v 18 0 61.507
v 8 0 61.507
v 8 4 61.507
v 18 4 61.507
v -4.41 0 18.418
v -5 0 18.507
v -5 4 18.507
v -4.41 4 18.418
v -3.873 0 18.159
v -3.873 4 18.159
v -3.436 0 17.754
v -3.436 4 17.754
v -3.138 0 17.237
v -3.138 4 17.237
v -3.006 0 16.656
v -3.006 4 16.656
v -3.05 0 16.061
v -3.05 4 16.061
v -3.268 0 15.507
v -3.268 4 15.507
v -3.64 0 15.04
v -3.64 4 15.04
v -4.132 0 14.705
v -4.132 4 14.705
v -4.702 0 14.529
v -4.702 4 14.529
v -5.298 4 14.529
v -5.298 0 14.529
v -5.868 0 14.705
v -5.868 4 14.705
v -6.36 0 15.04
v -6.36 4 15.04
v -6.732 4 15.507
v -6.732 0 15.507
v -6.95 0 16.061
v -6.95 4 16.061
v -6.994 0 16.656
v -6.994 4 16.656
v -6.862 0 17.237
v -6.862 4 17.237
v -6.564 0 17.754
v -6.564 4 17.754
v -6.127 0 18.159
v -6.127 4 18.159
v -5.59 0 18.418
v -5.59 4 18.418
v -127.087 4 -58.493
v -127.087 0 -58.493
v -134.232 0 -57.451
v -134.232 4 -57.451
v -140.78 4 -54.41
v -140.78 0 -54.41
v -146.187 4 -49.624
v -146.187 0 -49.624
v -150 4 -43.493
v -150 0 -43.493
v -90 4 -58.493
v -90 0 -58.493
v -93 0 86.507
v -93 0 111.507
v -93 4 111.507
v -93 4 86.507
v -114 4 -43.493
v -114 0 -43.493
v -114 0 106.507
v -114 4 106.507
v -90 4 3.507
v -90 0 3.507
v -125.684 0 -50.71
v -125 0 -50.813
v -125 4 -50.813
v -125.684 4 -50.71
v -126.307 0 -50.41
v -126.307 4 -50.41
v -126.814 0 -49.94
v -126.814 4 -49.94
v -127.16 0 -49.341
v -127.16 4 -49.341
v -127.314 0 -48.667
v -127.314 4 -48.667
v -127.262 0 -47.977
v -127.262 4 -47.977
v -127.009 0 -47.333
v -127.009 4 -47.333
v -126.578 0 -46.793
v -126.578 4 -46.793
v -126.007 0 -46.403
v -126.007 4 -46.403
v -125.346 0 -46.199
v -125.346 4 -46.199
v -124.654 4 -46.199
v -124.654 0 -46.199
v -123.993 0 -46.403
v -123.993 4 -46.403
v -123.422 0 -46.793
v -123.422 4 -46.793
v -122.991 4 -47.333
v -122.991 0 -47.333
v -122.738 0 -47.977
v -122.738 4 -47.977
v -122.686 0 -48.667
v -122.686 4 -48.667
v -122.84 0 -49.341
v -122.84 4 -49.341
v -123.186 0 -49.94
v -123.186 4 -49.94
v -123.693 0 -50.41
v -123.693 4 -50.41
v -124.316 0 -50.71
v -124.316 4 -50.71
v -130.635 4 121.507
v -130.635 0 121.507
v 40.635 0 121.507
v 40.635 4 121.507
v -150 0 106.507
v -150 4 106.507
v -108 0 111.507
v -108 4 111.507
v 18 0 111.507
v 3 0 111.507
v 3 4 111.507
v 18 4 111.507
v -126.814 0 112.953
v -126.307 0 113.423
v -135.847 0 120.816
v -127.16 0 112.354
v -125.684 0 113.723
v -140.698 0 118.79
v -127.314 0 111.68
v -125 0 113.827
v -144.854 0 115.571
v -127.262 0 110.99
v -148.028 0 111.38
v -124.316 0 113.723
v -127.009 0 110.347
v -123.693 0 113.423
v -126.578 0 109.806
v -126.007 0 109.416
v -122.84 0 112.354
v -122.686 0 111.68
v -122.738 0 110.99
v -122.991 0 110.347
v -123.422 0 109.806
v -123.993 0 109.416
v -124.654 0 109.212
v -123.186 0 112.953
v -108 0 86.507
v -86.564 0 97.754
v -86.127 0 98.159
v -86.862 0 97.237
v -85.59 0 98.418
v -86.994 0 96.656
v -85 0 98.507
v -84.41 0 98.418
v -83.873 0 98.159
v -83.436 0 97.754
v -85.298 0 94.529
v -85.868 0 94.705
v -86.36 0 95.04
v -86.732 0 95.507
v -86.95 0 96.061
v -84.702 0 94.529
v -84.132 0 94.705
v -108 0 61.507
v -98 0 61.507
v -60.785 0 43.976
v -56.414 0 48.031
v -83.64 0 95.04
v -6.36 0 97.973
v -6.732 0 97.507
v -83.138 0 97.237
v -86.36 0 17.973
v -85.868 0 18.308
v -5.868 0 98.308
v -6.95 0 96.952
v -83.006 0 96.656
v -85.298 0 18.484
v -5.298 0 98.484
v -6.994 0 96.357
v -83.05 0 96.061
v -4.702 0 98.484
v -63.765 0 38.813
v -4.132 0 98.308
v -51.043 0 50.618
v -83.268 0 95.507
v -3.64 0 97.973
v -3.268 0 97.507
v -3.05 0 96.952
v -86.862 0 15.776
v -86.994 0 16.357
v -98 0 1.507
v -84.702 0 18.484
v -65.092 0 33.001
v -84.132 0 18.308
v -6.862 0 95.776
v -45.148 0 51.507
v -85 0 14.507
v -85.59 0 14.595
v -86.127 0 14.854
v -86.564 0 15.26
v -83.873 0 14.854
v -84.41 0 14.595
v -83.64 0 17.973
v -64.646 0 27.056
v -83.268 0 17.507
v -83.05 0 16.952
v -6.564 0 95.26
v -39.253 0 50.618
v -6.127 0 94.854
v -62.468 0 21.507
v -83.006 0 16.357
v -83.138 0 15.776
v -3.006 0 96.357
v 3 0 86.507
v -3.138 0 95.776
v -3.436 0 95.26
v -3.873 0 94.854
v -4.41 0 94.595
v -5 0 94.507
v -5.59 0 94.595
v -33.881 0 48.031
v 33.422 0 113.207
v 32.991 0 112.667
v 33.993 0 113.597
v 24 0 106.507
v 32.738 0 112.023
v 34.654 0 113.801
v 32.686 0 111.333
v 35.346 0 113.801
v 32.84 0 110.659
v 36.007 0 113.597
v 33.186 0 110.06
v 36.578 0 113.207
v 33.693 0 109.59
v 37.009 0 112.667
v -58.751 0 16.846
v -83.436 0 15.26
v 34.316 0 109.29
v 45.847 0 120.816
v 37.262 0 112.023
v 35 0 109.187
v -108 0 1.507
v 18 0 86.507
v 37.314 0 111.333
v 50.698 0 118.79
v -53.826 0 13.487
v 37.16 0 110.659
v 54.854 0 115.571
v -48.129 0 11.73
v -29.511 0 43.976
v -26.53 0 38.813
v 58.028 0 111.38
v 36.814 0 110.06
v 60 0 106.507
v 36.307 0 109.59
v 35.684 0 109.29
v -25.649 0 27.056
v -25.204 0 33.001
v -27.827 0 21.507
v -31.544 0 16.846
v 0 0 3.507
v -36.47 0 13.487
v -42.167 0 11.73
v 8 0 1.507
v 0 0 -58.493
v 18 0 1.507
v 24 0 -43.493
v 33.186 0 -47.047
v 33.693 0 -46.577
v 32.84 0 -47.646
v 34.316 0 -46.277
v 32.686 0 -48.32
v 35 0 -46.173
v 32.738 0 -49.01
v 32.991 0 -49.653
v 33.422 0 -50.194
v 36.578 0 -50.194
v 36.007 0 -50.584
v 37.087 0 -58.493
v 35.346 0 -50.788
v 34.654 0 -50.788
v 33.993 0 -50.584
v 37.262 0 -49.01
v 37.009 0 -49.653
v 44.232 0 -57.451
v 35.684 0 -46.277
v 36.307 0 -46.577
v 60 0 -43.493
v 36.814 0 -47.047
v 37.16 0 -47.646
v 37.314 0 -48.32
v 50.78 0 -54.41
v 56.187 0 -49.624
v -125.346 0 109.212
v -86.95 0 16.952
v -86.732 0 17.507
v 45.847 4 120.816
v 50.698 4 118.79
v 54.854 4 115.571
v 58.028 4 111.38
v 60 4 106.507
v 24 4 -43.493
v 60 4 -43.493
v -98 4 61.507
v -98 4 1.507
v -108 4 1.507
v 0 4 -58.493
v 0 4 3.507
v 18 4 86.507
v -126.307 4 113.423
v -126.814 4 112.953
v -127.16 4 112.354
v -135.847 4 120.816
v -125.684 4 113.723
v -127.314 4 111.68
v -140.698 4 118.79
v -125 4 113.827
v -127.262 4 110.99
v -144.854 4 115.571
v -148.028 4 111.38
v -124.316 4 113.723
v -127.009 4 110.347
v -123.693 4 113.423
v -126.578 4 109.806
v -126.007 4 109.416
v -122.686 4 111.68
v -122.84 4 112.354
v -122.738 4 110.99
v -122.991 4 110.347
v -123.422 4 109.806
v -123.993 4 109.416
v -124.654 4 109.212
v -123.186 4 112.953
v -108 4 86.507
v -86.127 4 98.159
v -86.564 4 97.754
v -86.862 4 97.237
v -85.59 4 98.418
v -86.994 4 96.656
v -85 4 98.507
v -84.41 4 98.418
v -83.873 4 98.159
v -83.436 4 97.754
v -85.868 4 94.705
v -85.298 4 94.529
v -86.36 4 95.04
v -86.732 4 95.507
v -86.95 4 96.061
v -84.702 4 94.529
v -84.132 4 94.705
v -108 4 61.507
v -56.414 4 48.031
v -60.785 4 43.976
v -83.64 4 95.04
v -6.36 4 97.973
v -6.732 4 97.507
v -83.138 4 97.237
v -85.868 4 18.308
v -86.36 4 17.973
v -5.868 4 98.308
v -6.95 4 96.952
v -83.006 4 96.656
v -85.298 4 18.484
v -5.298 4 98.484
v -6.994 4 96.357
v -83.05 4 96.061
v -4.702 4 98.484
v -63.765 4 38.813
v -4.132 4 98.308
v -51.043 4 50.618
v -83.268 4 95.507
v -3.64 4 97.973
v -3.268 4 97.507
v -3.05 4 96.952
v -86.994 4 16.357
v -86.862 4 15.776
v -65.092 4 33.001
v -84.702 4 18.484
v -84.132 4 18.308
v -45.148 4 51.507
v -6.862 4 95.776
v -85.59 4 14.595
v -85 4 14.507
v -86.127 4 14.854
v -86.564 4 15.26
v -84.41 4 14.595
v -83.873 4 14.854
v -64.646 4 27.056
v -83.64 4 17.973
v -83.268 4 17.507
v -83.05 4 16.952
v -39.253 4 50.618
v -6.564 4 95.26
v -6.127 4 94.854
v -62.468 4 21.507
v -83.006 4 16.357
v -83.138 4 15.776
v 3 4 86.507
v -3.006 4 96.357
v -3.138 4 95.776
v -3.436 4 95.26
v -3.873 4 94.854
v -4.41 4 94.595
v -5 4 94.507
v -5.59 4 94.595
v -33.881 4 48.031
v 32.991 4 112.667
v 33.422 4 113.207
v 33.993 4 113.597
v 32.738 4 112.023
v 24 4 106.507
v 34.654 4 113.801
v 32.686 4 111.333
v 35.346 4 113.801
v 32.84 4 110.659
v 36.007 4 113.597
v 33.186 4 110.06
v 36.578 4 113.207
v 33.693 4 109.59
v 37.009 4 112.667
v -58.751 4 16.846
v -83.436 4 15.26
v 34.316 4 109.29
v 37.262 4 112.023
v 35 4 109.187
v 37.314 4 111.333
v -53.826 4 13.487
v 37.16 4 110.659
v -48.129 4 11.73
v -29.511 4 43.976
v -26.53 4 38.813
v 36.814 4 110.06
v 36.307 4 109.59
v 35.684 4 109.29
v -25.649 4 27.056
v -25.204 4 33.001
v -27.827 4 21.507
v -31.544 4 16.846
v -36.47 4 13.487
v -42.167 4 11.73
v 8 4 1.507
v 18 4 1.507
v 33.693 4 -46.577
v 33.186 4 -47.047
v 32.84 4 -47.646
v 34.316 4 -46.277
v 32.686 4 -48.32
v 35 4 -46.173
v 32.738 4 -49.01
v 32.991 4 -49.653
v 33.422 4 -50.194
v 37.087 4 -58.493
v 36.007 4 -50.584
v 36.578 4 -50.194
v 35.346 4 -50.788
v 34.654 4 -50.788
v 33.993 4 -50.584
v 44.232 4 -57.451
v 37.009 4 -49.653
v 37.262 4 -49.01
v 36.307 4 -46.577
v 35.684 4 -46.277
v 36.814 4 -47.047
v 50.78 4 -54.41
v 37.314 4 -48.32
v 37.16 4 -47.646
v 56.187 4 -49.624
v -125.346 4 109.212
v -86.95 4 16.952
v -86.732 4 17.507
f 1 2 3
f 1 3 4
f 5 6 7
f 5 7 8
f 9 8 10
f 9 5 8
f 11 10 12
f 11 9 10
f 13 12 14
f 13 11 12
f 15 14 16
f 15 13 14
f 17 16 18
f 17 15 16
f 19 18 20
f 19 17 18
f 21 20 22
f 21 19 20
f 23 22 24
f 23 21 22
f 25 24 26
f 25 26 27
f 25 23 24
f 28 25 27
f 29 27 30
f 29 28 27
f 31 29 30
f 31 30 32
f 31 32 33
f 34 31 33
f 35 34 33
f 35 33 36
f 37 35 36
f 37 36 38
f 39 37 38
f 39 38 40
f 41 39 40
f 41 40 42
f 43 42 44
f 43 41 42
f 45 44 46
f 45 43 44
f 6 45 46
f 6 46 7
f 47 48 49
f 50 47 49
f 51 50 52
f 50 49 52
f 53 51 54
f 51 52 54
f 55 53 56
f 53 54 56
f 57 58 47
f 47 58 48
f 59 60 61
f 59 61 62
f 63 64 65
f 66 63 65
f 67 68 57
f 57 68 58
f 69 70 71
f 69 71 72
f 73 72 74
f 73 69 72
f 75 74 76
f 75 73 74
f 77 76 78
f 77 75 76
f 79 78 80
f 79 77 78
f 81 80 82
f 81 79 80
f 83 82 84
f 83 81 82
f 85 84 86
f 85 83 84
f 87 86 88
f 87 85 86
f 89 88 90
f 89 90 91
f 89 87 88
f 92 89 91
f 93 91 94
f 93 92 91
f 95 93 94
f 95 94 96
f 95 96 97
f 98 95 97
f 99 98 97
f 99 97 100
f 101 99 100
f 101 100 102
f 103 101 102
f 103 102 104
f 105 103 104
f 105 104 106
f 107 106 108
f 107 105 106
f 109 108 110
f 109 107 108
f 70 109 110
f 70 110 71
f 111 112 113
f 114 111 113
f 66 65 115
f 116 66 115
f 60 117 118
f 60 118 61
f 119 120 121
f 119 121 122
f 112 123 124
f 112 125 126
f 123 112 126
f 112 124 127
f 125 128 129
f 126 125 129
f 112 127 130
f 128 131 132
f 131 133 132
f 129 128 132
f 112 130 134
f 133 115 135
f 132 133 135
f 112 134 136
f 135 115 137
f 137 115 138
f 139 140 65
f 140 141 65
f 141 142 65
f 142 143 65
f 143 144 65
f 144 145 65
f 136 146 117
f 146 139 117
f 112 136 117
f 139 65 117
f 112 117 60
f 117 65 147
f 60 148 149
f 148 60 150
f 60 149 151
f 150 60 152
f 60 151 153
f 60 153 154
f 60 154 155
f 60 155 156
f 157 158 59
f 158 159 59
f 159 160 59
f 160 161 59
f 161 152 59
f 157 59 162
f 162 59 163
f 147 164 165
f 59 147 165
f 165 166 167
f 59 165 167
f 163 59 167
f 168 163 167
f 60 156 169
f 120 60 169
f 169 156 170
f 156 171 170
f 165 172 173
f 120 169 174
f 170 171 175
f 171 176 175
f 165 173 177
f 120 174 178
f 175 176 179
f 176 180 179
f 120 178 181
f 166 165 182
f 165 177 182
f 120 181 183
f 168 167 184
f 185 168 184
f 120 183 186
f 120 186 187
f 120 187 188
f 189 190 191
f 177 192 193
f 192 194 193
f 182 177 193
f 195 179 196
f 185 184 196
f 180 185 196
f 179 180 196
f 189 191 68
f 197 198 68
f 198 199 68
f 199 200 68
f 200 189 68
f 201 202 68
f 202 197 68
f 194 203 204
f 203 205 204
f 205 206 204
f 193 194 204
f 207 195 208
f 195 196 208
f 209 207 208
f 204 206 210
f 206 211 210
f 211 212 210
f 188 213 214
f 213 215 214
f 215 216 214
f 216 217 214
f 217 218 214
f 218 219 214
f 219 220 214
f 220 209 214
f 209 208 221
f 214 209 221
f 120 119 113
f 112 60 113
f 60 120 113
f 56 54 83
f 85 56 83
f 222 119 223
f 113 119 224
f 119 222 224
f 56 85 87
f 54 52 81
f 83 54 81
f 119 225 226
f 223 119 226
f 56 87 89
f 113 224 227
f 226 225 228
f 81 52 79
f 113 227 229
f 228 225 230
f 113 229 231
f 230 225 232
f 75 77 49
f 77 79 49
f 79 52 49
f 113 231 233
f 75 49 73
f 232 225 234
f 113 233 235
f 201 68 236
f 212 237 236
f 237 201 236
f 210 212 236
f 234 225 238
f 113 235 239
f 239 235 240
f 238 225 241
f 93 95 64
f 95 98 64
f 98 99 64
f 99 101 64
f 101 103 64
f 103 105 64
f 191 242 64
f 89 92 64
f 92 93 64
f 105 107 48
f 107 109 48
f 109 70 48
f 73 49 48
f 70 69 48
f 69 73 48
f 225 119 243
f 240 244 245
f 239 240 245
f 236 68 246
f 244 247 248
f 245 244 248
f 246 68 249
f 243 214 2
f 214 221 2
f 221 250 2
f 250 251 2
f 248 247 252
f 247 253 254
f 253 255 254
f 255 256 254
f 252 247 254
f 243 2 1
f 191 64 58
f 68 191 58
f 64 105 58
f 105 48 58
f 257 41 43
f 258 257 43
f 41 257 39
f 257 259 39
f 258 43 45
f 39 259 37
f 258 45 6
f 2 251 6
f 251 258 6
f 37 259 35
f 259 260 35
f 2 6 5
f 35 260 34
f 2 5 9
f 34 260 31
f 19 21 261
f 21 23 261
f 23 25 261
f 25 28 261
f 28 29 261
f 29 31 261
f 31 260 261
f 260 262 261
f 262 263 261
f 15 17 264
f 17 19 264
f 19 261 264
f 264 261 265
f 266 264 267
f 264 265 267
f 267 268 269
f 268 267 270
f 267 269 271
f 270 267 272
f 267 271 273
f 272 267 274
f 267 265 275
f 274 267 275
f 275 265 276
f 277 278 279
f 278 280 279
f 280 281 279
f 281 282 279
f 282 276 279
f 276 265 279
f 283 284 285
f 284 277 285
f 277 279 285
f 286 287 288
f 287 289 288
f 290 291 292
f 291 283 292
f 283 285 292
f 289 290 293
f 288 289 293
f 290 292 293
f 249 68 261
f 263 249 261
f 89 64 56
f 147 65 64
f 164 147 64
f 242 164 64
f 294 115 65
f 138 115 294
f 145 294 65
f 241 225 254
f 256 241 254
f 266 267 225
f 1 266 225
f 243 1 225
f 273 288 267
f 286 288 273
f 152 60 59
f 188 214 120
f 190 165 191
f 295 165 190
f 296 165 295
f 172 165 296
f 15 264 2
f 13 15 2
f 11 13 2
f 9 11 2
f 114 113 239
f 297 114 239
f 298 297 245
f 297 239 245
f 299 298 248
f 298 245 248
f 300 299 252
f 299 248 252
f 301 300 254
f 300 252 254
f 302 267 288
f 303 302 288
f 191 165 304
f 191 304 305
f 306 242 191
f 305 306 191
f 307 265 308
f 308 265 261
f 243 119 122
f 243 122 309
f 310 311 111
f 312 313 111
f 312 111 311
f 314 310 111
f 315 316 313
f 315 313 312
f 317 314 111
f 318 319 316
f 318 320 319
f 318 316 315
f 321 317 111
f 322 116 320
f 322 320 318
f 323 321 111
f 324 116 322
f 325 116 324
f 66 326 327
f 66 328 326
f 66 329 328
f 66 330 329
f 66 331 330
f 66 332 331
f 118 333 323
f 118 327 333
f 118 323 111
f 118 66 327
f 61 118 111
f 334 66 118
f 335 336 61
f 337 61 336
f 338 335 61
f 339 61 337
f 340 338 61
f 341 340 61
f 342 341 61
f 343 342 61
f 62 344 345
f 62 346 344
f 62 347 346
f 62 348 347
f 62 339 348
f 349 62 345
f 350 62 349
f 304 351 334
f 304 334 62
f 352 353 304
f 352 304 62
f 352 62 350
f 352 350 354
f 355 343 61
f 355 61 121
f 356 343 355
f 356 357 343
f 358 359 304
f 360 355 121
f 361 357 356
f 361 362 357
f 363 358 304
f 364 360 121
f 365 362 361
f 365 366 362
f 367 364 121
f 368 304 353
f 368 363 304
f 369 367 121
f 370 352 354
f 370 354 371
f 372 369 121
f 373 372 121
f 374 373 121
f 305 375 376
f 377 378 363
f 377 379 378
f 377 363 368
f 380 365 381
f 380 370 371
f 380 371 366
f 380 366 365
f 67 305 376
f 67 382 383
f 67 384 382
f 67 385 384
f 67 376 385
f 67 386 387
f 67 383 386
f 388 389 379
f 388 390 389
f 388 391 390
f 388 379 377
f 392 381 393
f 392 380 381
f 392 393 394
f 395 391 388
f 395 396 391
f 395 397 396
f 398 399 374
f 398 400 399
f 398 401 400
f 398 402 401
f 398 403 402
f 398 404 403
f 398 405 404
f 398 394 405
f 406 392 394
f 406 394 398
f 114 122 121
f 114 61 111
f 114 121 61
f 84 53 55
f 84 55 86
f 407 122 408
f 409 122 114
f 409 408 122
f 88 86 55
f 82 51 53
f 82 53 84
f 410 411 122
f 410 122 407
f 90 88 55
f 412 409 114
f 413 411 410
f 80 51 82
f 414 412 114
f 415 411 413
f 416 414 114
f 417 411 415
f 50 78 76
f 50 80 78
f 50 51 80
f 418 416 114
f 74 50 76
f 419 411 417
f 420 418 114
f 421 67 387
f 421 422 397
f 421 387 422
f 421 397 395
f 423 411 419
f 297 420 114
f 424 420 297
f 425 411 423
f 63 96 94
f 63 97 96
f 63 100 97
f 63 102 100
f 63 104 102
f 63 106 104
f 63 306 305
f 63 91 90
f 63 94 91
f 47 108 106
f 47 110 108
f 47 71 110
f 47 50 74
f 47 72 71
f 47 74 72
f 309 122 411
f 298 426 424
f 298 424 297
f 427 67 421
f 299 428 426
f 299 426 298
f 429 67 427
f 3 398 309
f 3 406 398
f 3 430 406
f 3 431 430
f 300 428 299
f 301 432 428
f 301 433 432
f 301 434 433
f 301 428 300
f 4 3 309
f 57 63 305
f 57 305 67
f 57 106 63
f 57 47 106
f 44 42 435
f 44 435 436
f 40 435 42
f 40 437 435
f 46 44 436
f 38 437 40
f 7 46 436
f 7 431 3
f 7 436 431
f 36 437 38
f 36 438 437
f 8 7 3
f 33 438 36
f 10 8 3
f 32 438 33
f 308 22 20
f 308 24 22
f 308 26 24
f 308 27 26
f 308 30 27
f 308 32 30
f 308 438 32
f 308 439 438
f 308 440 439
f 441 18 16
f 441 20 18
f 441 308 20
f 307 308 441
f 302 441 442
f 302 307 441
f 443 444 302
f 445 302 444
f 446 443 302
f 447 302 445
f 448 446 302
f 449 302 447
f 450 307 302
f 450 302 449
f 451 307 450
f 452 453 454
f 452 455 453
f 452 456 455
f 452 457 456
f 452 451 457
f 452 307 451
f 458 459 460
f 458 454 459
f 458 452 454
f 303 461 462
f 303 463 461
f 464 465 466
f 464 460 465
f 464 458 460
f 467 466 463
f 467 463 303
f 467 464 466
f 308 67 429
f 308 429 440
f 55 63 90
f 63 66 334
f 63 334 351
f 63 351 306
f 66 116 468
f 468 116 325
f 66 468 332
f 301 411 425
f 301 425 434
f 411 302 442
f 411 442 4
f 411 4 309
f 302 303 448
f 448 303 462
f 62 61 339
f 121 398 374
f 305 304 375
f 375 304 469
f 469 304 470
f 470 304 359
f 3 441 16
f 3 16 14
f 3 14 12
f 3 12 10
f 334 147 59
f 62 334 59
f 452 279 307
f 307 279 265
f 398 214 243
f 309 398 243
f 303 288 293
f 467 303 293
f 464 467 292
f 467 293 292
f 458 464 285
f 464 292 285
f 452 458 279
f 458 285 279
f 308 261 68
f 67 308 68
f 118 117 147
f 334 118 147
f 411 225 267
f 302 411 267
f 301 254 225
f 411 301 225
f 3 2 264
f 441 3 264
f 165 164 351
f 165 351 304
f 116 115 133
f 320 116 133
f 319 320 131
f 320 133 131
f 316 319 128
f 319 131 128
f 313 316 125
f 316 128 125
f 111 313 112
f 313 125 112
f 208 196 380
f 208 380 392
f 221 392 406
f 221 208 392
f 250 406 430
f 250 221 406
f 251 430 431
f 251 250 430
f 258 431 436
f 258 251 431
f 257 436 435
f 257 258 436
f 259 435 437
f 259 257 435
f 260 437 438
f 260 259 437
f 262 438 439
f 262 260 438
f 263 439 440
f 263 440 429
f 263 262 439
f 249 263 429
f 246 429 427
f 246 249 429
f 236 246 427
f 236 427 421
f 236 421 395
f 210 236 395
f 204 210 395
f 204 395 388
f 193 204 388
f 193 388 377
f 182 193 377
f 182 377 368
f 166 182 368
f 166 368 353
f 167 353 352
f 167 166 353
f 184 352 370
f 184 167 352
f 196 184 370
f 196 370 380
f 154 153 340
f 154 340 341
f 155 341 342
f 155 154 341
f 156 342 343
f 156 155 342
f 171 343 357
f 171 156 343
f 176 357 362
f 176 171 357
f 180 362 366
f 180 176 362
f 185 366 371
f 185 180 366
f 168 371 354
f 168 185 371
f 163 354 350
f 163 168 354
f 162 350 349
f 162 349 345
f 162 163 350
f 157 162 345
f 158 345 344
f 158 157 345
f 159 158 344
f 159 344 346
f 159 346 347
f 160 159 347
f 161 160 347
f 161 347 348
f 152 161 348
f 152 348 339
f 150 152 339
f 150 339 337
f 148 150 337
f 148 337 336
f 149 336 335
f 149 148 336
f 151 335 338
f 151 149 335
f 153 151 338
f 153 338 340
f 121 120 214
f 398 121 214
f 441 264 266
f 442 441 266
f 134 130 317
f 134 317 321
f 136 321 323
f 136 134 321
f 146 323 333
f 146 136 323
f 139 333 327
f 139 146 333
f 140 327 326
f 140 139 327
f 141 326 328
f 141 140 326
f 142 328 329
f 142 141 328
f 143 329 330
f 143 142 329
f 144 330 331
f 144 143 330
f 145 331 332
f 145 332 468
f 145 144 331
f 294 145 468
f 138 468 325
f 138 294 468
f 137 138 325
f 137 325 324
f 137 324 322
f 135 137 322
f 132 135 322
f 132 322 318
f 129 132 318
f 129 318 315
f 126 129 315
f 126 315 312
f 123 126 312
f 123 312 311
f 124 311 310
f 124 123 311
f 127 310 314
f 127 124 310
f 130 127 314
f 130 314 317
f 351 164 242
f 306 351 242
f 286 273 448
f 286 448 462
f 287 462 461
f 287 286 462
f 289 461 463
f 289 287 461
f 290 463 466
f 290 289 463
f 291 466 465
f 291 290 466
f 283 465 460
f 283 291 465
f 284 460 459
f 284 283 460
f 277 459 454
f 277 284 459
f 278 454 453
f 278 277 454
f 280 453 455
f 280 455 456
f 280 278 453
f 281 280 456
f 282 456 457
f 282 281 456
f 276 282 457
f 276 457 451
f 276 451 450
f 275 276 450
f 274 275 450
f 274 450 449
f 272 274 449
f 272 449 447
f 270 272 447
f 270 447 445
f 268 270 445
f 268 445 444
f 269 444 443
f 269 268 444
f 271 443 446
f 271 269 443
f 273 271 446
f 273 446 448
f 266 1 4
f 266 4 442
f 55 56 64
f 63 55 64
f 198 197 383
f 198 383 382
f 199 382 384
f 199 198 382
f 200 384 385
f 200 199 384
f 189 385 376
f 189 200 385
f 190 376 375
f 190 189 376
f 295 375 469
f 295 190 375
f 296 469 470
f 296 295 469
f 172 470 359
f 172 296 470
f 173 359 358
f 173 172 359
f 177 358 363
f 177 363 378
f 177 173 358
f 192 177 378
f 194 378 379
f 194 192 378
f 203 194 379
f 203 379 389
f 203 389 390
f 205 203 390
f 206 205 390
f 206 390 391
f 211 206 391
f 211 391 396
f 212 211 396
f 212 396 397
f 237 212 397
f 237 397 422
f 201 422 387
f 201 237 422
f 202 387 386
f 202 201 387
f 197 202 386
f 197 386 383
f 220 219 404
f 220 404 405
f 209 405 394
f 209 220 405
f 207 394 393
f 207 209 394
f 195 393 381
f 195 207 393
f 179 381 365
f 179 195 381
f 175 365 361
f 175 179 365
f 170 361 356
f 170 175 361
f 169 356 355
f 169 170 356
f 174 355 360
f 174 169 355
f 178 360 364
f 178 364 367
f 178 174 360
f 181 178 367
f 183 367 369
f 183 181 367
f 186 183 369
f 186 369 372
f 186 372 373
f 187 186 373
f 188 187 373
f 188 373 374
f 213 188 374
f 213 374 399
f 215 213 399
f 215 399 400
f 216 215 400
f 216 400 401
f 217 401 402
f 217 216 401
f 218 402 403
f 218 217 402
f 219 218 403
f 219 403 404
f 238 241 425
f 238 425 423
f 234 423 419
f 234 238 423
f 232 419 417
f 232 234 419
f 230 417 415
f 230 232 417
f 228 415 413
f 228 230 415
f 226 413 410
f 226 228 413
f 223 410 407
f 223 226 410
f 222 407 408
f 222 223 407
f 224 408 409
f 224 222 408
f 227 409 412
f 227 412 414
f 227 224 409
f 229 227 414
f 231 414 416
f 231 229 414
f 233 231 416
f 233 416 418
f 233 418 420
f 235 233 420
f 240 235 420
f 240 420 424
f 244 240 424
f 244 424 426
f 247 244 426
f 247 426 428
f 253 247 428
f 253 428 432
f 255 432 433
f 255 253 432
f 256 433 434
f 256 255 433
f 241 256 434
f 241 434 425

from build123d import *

# Parameters (mm, degrees)
SKETCH1_R           = 20
SKETCH1_R_2         = 2.32
SKETCH1_R_3         = 2
SKETCH1_W           = 10
SKETCH1_H           = 60
SKETCH1_W_2         = 15
SKETCH1_H_2         = 25
BOSS_EXTRUDE1_DEPTH = 4
FILLET2_R           = 20
FILLET3_R           = 25


with BuildPart() as part:
    # Sketch1 → Boss-Extrude1 (new body)
    with BuildSketch(Plane(origin=(0, 0, 0), x_dir=(1, 0, 0), z_dir=(0, 1, 0))):
        Polygon((-150, 43.493460664), (-114, 43.493460664), (-114, -106.506539336), (-150, -106.506539336), (-150, -121.506539336), (60, -121.506539336), (60, -106.506539336), (24, -106.506539336), (24, 43.493460664), (60, 43.493460664), (60, 58.493460664), (0, 58.493460664), (0, -3.506539336), (-90, -3.506539336), (-90, 58.493460664), (-150, 58.493460664), align=None)
        with Locations(Location((-45.147898231, -31.506539336, 0), (0, 0, 270))):
            Circle(SKETCH1_R, mode=Mode.SUBTRACT)
        with Locations(Location((-125, -111.506539336, 0), (0, 0, 270))):
            Circle(SKETCH1_R_2, mode=Mode.SUBTRACT)
        with Locations(Location((-125, 48.493460664, 0), (0, 0, 90))):
            Circle(SKETCH1_R_2, mode=Mode.SUBTRACT)
        with Locations(Location((35, 48.493460664, 0), (0, 0, 270))):
            Circle(SKETCH1_R_2, mode=Mode.SUBTRACT)
        with Locations(Location((35, -111.506539336, 0), (0, 0, 90))):
            Circle(SKETCH1_R_2, mode=Mode.SUBTRACT)
        with Locations(Location((-85, -96.506539336, 0), (0, 0, 270))):
            Circle(SKETCH1_R_3, mode=Mode.SUBTRACT)
        with Locations(Location((-5, -96.506539336, 0), (0, 0, 90))):
            Circle(SKETCH1_R_3, mode=Mode.SUBTRACT)
        with Locations(Location((-85, -16.506539336, 0), (0, 0, 90))):
            Circle(SKETCH1_R_3, mode=Mode.SUBTRACT)
        with Locations(Location((-5, -16.506539336, 0), (0, 0, 270))):
            Circle(SKETCH1_R_3, mode=Mode.SUBTRACT)
        with Locations((13, -31.506539336)):
            Rectangle(SKETCH1_W, SKETCH1_H, mode=Mode.SUBTRACT)
        with Locations((-103, -31.506539336)):
            Rectangle(SKETCH1_W, SKETCH1_H, mode=Mode.SUBTRACT)
        with Locations((10.5, -99.006539336)):
            Rectangle(SKETCH1_W_2, SKETCH1_H_2, mode=Mode.SUBTRACT)
        with Locations((-100.5, -99.006539336)):
            Rectangle(SKETCH1_W_2, SKETCH1_H_2, mode=Mode.SUBTRACT)
    extrude(amount=BOSS_EXTRUDE1_DEPTH)

    # Fillet2
    # the kernel refuses this fillet: 20 mm, written as the material it takes off along each edge
    with BuildSketch(Plane(origin=(60, -48.412291828, 121.506539336), x_dir=(-1, 0, 0), z_dir=(0, 1, 0))) as fillet2_piece_1:
        with BuildLine():
            CenterArc((19.364916731, -20), FILLET2_R, 90, 75.522487814)
            Line((0, -15), (-0.387298335, -14.9))
            ThreePointArc((-0.387298335, -14.9), (-0.4, -7.5), (-0.4, 0))
            Line((-0.4, 0), (0, 0.4))
            Line((0, 0.4), (19.364916731, 0.4))
            Line((19.364916731, 0.4), (19.364916731, 0))
        make_face()
    extrude(amount=100.824583655, mode=Mode.SUBTRACT)
    with BuildSketch(Plane(origin=(-150, -48.412291828, 121.506539336), x_dir=(0, 0, -1), z_dir=(0, 1, 0))) as fillet2_piece_2:
        with BuildLine():
            CenterArc((20, -19.364916731), FILLET2_R, 104.477512186, 75.522487814)
            Line((0, -19.364916731), (-0.4, -19.364916731))
            Line((-0.4, -19.364916731), (-0.4, 0))
            Line((-0.4, 0), (0, 0.4))
            ThreePointArc((0, 0.4), (7.5, 0.4), (14.9, 0.387298335))
            Line((14.9, 0.387298335), (15, 0))
        make_face()
    extrude(amount=100.824583655, mode=Mode.SUBTRACT)

    # Fillet3
    # the kernel refuses this fillet: 25 mm, written as the material it takes off along each edge
    with BuildSketch(Plane(origin=(60, -57.282196187, -58.493460664), x_dir=(-1, 0, 0), z_dir=(0, 1, 0))) as fillet3_piece_1:
        with BuildLine():
            CenterArc((22.912878475, 25), FILLET3_R, 203.578178478, 66.421821522)
            Line((0, 15), (-0.458257569, 14.8))
            ThreePointArc((-0.458257569, 14.8), (-0.5, 7.5), (-0.5, 0))
            Line((-0.5, 0), (0, -0.5))
            Line((0, -0.5), (22.912878475, -0.5))
            Line((22.912878475, -0.5), (22.912878475, 0))
        make_face()
    extrude(amount=118.564392374, mode=Mode.SUBTRACT)
    with BuildSketch(Plane(origin=(-150, -57.282196187, -58.493460664), x_dir=(0, 0, 1), z_dir=(0, 1, 0))) as fillet3_piece_2:
        with BuildLine():
            CenterArc((25, 22.912878475), FILLET3_R, 180, 66.421821522)
            Line((0, 22.912878475), (-0.5, 22.912878475))
            Line((-0.5, 22.912878475), (-0.5, 0))
            Line((-0.5, 0), (0, -0.5))
            ThreePointArc((0, -0.5), (7.5, -0.5), (14.8, -0.458257569))
            Line((14.8, -0.458257569), (15, 0))
        make_face()
    extrude(amount=118.564392374, mode=Mode.SUBTRACT)


solid = part.part
